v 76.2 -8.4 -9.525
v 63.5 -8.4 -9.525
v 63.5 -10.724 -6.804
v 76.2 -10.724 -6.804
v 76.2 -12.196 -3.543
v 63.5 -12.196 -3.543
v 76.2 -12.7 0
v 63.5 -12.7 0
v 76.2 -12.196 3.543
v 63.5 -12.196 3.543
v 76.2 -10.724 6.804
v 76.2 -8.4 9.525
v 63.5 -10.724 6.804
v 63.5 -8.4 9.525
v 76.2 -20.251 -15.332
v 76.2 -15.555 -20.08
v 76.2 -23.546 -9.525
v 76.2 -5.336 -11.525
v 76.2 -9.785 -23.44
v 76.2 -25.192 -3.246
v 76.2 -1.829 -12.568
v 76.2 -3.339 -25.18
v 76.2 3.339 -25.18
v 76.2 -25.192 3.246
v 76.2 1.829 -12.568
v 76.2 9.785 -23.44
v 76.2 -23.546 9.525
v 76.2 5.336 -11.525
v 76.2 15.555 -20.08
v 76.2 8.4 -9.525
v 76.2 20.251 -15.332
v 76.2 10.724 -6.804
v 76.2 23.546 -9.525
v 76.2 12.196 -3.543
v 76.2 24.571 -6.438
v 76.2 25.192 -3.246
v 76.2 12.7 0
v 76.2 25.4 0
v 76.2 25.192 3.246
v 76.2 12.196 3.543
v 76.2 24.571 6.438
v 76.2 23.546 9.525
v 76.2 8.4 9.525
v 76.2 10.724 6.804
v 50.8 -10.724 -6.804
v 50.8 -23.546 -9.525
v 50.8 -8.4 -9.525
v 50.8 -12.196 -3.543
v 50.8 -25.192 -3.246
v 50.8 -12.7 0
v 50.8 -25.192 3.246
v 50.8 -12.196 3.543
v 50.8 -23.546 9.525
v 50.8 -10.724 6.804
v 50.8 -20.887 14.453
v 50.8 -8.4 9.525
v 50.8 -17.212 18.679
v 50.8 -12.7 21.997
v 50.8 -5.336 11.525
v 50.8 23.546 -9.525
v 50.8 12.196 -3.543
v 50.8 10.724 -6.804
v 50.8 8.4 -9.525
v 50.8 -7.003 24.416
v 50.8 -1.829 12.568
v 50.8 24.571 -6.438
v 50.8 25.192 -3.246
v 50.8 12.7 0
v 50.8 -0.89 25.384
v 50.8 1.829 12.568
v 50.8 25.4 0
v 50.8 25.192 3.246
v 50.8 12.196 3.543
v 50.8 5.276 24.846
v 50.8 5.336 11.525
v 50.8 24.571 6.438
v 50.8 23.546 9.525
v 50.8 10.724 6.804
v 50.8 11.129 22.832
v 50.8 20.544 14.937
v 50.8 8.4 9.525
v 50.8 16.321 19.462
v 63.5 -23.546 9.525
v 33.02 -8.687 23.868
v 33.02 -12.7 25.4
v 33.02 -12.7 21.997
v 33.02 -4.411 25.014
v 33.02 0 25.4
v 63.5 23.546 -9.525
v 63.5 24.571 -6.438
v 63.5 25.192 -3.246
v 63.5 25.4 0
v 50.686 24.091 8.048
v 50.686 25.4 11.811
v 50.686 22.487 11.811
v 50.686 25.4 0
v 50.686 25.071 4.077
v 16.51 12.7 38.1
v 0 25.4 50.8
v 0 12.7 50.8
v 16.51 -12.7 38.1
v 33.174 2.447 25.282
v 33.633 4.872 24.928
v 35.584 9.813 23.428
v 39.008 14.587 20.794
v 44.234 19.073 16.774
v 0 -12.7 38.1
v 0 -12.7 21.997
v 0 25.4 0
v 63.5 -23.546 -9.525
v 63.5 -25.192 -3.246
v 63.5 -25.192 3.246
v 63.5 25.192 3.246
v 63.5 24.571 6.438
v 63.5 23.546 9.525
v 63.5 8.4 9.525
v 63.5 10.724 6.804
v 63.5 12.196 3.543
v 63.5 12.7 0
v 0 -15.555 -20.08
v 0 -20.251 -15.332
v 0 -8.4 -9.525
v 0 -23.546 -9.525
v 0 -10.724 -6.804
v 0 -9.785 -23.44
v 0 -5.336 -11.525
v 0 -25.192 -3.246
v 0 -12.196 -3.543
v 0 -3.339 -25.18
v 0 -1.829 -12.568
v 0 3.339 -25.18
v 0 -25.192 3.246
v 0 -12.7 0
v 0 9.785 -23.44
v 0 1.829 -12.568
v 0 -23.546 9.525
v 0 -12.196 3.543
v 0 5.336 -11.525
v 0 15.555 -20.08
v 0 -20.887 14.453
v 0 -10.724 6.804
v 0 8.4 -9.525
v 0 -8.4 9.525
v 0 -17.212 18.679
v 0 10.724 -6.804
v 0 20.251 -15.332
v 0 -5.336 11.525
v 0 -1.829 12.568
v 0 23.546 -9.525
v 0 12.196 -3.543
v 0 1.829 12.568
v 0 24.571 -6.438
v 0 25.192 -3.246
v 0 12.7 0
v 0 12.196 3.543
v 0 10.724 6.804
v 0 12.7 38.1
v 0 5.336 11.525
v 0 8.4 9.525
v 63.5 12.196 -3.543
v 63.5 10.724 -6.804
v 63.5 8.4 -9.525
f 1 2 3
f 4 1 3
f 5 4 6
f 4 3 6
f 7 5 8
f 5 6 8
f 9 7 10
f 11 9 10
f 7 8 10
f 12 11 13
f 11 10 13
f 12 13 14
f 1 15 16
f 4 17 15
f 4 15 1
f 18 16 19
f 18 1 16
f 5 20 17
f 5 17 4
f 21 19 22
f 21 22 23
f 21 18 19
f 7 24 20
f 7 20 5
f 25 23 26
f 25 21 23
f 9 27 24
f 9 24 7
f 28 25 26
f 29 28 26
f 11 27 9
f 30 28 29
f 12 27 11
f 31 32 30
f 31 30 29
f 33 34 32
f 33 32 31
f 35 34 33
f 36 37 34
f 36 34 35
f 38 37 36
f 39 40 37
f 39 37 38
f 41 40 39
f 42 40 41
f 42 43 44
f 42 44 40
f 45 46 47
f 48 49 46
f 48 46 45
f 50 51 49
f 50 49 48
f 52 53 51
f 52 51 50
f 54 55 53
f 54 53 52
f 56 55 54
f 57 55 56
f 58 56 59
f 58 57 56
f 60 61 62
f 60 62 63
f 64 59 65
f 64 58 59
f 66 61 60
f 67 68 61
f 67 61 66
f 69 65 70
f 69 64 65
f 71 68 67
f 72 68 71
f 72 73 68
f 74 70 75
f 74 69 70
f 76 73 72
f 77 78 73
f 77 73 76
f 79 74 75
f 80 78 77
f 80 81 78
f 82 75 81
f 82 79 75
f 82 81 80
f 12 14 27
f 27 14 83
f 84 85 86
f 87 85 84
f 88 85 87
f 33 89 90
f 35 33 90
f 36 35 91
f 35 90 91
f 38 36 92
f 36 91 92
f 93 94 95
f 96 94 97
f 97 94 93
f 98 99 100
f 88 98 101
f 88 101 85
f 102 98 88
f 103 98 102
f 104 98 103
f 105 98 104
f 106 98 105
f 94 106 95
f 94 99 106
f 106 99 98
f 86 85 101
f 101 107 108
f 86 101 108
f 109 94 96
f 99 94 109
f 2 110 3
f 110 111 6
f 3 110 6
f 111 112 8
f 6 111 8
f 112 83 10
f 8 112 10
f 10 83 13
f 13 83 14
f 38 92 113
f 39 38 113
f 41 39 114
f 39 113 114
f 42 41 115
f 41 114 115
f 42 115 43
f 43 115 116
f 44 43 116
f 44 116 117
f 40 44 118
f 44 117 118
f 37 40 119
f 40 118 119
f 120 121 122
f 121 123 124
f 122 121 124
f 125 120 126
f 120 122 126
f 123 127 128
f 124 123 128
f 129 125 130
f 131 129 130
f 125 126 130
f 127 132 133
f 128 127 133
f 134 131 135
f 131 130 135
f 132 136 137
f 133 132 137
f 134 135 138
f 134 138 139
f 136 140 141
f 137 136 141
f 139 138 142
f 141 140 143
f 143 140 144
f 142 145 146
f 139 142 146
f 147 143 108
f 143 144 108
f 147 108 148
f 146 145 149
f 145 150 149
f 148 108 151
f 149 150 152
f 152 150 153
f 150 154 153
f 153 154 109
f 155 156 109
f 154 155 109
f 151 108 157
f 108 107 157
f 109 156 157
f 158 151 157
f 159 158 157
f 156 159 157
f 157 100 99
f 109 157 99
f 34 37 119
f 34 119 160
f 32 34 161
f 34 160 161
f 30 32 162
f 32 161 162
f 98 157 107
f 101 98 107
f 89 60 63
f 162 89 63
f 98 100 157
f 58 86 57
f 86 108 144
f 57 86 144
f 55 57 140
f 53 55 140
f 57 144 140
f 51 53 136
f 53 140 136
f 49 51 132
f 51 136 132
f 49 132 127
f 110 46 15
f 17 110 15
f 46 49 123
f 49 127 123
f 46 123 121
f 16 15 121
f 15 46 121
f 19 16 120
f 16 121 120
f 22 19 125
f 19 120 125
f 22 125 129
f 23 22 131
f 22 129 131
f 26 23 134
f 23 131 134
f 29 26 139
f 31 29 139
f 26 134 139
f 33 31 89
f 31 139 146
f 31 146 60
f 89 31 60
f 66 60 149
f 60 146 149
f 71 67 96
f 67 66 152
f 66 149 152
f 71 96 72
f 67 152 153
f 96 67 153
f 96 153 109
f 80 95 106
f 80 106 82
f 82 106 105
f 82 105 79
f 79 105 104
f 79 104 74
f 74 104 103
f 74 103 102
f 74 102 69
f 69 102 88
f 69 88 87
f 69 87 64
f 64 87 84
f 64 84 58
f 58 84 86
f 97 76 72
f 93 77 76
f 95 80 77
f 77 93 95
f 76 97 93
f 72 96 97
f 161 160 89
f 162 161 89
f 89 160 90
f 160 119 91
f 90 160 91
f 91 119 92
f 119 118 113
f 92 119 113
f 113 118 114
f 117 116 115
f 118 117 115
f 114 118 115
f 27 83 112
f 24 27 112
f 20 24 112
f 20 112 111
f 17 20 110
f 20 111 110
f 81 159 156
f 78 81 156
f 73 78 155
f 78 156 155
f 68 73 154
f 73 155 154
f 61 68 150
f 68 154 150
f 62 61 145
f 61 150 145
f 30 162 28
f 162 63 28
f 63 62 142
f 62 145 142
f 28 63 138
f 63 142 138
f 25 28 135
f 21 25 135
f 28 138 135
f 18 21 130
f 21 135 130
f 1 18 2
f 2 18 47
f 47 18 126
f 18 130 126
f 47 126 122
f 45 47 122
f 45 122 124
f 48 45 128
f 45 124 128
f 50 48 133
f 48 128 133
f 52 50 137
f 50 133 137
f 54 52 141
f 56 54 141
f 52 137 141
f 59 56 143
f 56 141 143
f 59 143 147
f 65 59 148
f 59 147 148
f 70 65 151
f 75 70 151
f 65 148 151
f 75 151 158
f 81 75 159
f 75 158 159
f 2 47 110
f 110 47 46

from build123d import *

# Parameters (mm, degrees)
F1_DEPTH = 50.8
F2_DEPTH = 63.5
F3_DEPTH = 33.02
F5_DEPTH = 50.801
F6_DEPTH = 50.8
F8_DEPTH = 12.7


with BuildPart() as f1:
    # F0 (on Right) → F1 (new body)
    with BuildSketch(Plane.YZ):
        with BuildLine():
            ThreePointArc((-8.4002604126, 9.525), (0, 12.7), (8.4002604126, 9.525))
            Line((8.4002604126, 9.525), (23.5464301965, 9.525))
            ThreePointArc((23.5464301965, 9.525), (8.2643354373, 24.017925801), (-12.7, 21.9970452561))
            ThreePointArc((-12.7, 21.9970452561), (-19.1660873346, 16.6679661712), (-23.5464301965, 9.525))
            Line((-23.5464301965, 9.525), (-8.4002604126, 9.525))
        make_face()
        with BuildLine():
            ThreePointArc((-8.4002604126, -9.525), (-12.7, 0), (-8.4002604126, 9.525))
            Line((-8.4002604126, 9.525), (-23.5464301965, 9.525))
            ThreePointArc((-23.5464301965, 9.525), (-25.4, 0), (-23.5464301965, -9.525))
            Line((-23.5464301965, -9.525), (-8.4002604126, -9.525))
        make_face()
    extrude(amount=F1_DEPTH)

    # F0 (on Right) → F2 (join)
    with BuildSketch(Plane.YZ):
        with BuildLine():
            Line((23.5464301965, -9.525), (8.4002604126, -9.525))
            ThreePointArc((8.4002604126, -9.525), (0, -12.7), (-8.4002604126, -9.525))
            Line((-8.4002604126, -9.525), (-23.5464301965, -9.525))
            ThreePointArc((-23.5464301965, -9.525), (0, -25.4), (23.5464301965, -9.525))
        make_face()
    extrude(amount=F2_DEPTH)

    # F0 (on Right) → F3 (join)
    with BuildSketch(Plane.YZ):
        with BuildLine():
            ThreePointArc((-12.7, 21.9970452561), (8.2643354373, 24.017925801), (23.5464301965, 9.525))
            ThreePointArc((23.5464301965, 9.525), (24.9323016085, 4.8518384664), (25.4, 0))
            Line((25.4, 0), (25.4, 50.8))
            Line((25.4, 50.8), (12.7, 50.8))
            Line((12.7, 50.8), (12.7, 38.1))
            Line((12.7, 38.1), (-12.7, 38.1))
            Line((-12.7, 38.1), (-12.7, 21.9970452561))
        make_face()
    extrude(amount=F3_DEPTH)

    # F4 (on face) → F5 (cut, through all)
    with BuildSketch(Plane(origin=(0, 25.4, 0), x_dir=(-1, 0, 0), z_dir=(0, 1, 0))):
        Polygon((-33.02, 50.8), (-33.02, 25.4), (0, 50.8), align=None)
    extrude(amount=-F5_DEPTH, mode=Mode.SUBTRACT)

    # F0 (on Right) → F6 (join)
    with BuildSketch(Plane.YZ):
        with BuildLine():
            Line((23.5464301965, -9.525), (8.4002604126, -9.525))
            ThreePointArc((8.4002604126, -9.525), (0, -12.7), (-8.4002604126, -9.525))
            Line((-8.4002604126, -9.525), (-23.5464301965, -9.525))
            ThreePointArc((-23.5464301965, -9.525), (0, -25.4), (23.5464301965, -9.525))
        make_face()
        with BuildLine():
            ThreePointArc((-8.4002604126, -9.525), (-12.7, 0), (-8.4002604126, 9.525))
            Line((-8.4002604126, 9.525), (-23.5464301965, 9.525))
            ThreePointArc((-23.5464301965, 9.525), (-25.4, 0), (-23.5464301965, -9.525))
            Line((-23.5464301965, -9.525), (-8.4002604126, -9.525))
        make_face()
        with BuildLine():
            ThreePointArc((8.4002604126, 9.525), (11.5752604126, 5.2252604126), (12.7, 0))
            ThreePointArc((12.7, 0), (11.5752604126, -5.2252604126), (8.4002604126, -9.525))
            Line((8.4002604126, -9.525), (23.5464301965, -9.525))
            ThreePointArc((23.5464301965, -9.525), (24.9323016085, -4.8518384664), (25.4, 0))
            ThreePointArc((25.4, 0), (24.9323016085, 4.8518384664), (23.5464301965, 9.525))
            Line((23.5464301965, 9.525), (8.4002604126, 9.525))
        make_face()
    extrude(amount=F6_DEPTH)

    # F7 (on face) → F8 (join)
    with BuildSketch(Plane.YZ.offset(63.5)):
        with BuildLine():
            Line((-8.4002604126, 9.525), (-23.5464301965, 9.525))
            ThreePointArc((-23.5464301965, 9.525), (-25.4, 0), (-23.5464301965, -9.525))
            Line((-23.5464301965, -9.525), (-8.4002604126, -9.525))
            ThreePointArc((-8.4002604126, -9.525), (-12.7, 0), (-8.4002604126, 9.525))
        make_face()
        with BuildLine():
            ThreePointArc((-23.5464301965, -9.525), (0, -25.4), (23.5464301965, -9.525))
            Line((23.5464301965, -9.525), (8.4002604126, -9.525))
            ThreePointArc((8.4002604126, -9.525), (0, -12.7), (-8.4002604126, -9.525))
            Line((-8.4002604126, -9.525), (-23.5464301965, -9.525))
        make_face()
        with BuildLine():
            ThreePointArc((23.5464301965, -9.525), (24.9323016085, -4.8518384664), (25.4, 0))
            ThreePointArc((25.4, 0), (24.9323016085, 4.8518384664), (23.5464301965, 9.525))
            Line((23.5464301965, 9.525), (8.4002604126, 9.525))
            ThreePointArc((8.4002604126, 9.525), (11.5752604126, 5.2252604126), (12.7, 0))
            ThreePointArc((12.7, 0), (11.5752604126, -5.2252604126), (8.4002604126, -9.525))
            Line((8.4002604126, -9.525), (23.5464301965, -9.525))
        make_face()
    extrude(amount=F8_DEPTH)

    # F9 (on face) → F10 (join, up to the next surface of F1)
    with BuildSketch(Plane(origin=(0, 25.4, 0), x_dir=(-1, 0, 0), z_dir=(0, 1, 0))):
        Polygon((-33.02, 0), (-33.02, 25.4), (-50.6857, 11.811), (-50.6857, 0), align=None)
    extrude(until=Until.NEXT, dir=(0, -1, 0))


solid = f1.part
